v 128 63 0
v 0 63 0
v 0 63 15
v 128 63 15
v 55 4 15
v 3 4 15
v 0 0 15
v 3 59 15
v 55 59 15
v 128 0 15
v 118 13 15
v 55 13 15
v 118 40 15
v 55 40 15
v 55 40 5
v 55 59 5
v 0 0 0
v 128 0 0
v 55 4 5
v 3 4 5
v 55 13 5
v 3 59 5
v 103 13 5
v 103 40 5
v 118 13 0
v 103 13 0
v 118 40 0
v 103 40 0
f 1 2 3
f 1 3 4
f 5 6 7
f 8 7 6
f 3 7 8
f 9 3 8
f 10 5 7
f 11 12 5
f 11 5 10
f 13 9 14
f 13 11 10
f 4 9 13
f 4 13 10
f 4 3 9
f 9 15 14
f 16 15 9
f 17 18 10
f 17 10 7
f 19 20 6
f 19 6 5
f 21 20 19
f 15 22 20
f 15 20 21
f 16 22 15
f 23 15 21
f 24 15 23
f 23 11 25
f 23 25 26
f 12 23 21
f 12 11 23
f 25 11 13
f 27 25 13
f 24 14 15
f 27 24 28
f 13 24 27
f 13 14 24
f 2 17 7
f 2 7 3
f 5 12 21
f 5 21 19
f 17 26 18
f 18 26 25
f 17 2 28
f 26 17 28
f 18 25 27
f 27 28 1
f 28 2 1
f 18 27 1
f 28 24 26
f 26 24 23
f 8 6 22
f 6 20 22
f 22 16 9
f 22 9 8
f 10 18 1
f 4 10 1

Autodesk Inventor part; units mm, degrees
ref_plane "YZ Plane" through (0, 0, 0) normal (1, 0, 0) x (0, 1, 0)
ref_plane "XZ Plane" through (0, 0, 0) normal (0, 1, 0) x (-1, 0, 0)
ref_plane "XY Plane" through (0, 0, 0) normal (0, 0, 1) x (1, 0, 0)
sketch "Sketch3" plane through (0, 0, 0) normal (0, 0, 1) x (1, 0, 0)
  line L0 (3, 4) -> (128, 4)
  line L1 (128, 4) -> (128, 59)
  line L2 (128, 59) -> (3, 59)
  line L3 (3, 59) -> (3, 4)
  point P0 (0, 0)
  dimension "d0" = 125
  dimension "d1" = 55
extrude "Extrusion1" add sketch "Sketch3" along normal blind 5
sketch "Sketch7" plane through (0, 0, 5) normal (0, 0, 1) x (1, 0, 0)
  line L0 (128, 4) -> (128, 59) projected
  line L1 (0, 4) -> (128, 4) projected
  line L2 (128, 59) -> (53, 59)
  line L3 (53, 59) -> (53, 4)
  line L4 (53, 4) -> (128, 4)
  line L5 (128, 4) -> (128, 59)
  point P0 (0, 0)
  dimension "d20" = 75
extrude "Extrusion3" add sketch "Sketch7" along normal blind 10
sketch "Sketch8" plane through (0, 0, 15) normal (0, 0, 1) x (1, 0, 0)
  line L0 (53, 59) -> (53, 4) projected
  line L1 (53, 4) -> (53, 13)
  line L2 (53, 13) -> (118, 13)
  line L3 (118, 13) -> (118, 40)
  line L4 (118, 40) -> (53, 40)
  line L5 (53, 40) -> (53, 13)
  point P0 (0, 0)
  dimension "d23" = 9
  dimension "d24" = 65
  dimension "d25" = 27
extrude "Extrusion4" cut sketch "Sketch8" against normal blind 10
sketch "Sketch9" plane through (0, 0, 15) normal (0, 0, 1) x (1, 0, 0)
  line L0 (53, 40) -> (118, 40) projected
  line L1 (118, 13) -> (53, 13) projected
  line L2 (118, 40) -> (103, 40)
  line L3 (103, 40) -> (103, 13)
  line L4 (103, 13) -> (118, 13)
  line L5 (118, 13) -> (118, 40)
  point P0 (0, 0)
  dimension "d28" = 15
extrude "Extrusion5" cut sketch "Sketch9" against normal blind 20
sketch "Sketch12" plane through (0, 0, 5) normal (0, 0, 1) x (1, 0, 0)
  line L0 (0, 0) -> (0, 63)
  line L1 (0, 63) -> (128, 63)
  line L2 (128, 63) -> (128, 59)
  line L3 (3, 59) -> (128, 59) projected
  line L4 (128, 59) -> (3, 59)
  line L5 (3, 4) -> (3, 59) projected
  line L6 (3, 59) -> (3, 4)
  line L7 (128, 59) -> (128, 4) projected
  line L8 (3, 4) -> (128, 4)
  line L9 (128, 4) -> (128, 0)
  line L10 (128, 0) -> (0, 0)
  dimension "d35" = 63
  dimension "d36" = 128
  dimension "d37" = 90
extrude "Extrusion6" add sketch "Sketch12" along normal blind 10 and the other way blind 5 contours L0 L1 L2 L3 L5 L8 L9 L10
sketch "Sketch14" plane through (0, 0, 5) normal (0, 0, 1) x (1, 0, 0)
  line L0 (53, 40) -> (103, 40) projected
  line L1 (53, 40) -> (55, 40)
  line L2 (55, 40) -> (55, 59)
  line L3 (55, 59) -> (53, 59)
  line L4 (53, 59) -> (53, 40)
  point P0 (0, 0)
  dimension "d42" = 2
extrude "Extrusion7" cut sketch "Sketch14" along normal blind 10
sketch "Sketch15" plane through (0, 0, 15) normal (0, 0, 1) x (1, 0, 0)
  line L0 (53, 4) -> (53, 13) projected
  line L1 (53, 13) -> (55, 13)
  line L2 (55, 13) -> (55, 4)
  line L3 (55, 4) -> (53, 4)
  line L4 (53, 4) -> (53, 13)
  point P0 (0, 0)
  dimension "d45" = 2
extrude "Extrusion8" cut sketch "Sketch15" against normal blind 10
sketch "Sketch17" plane through (0, 0, 15) normal (0, 0, 1) x (1, 0, 0)
  point P0 (0, 0)
properties part number "Case"
